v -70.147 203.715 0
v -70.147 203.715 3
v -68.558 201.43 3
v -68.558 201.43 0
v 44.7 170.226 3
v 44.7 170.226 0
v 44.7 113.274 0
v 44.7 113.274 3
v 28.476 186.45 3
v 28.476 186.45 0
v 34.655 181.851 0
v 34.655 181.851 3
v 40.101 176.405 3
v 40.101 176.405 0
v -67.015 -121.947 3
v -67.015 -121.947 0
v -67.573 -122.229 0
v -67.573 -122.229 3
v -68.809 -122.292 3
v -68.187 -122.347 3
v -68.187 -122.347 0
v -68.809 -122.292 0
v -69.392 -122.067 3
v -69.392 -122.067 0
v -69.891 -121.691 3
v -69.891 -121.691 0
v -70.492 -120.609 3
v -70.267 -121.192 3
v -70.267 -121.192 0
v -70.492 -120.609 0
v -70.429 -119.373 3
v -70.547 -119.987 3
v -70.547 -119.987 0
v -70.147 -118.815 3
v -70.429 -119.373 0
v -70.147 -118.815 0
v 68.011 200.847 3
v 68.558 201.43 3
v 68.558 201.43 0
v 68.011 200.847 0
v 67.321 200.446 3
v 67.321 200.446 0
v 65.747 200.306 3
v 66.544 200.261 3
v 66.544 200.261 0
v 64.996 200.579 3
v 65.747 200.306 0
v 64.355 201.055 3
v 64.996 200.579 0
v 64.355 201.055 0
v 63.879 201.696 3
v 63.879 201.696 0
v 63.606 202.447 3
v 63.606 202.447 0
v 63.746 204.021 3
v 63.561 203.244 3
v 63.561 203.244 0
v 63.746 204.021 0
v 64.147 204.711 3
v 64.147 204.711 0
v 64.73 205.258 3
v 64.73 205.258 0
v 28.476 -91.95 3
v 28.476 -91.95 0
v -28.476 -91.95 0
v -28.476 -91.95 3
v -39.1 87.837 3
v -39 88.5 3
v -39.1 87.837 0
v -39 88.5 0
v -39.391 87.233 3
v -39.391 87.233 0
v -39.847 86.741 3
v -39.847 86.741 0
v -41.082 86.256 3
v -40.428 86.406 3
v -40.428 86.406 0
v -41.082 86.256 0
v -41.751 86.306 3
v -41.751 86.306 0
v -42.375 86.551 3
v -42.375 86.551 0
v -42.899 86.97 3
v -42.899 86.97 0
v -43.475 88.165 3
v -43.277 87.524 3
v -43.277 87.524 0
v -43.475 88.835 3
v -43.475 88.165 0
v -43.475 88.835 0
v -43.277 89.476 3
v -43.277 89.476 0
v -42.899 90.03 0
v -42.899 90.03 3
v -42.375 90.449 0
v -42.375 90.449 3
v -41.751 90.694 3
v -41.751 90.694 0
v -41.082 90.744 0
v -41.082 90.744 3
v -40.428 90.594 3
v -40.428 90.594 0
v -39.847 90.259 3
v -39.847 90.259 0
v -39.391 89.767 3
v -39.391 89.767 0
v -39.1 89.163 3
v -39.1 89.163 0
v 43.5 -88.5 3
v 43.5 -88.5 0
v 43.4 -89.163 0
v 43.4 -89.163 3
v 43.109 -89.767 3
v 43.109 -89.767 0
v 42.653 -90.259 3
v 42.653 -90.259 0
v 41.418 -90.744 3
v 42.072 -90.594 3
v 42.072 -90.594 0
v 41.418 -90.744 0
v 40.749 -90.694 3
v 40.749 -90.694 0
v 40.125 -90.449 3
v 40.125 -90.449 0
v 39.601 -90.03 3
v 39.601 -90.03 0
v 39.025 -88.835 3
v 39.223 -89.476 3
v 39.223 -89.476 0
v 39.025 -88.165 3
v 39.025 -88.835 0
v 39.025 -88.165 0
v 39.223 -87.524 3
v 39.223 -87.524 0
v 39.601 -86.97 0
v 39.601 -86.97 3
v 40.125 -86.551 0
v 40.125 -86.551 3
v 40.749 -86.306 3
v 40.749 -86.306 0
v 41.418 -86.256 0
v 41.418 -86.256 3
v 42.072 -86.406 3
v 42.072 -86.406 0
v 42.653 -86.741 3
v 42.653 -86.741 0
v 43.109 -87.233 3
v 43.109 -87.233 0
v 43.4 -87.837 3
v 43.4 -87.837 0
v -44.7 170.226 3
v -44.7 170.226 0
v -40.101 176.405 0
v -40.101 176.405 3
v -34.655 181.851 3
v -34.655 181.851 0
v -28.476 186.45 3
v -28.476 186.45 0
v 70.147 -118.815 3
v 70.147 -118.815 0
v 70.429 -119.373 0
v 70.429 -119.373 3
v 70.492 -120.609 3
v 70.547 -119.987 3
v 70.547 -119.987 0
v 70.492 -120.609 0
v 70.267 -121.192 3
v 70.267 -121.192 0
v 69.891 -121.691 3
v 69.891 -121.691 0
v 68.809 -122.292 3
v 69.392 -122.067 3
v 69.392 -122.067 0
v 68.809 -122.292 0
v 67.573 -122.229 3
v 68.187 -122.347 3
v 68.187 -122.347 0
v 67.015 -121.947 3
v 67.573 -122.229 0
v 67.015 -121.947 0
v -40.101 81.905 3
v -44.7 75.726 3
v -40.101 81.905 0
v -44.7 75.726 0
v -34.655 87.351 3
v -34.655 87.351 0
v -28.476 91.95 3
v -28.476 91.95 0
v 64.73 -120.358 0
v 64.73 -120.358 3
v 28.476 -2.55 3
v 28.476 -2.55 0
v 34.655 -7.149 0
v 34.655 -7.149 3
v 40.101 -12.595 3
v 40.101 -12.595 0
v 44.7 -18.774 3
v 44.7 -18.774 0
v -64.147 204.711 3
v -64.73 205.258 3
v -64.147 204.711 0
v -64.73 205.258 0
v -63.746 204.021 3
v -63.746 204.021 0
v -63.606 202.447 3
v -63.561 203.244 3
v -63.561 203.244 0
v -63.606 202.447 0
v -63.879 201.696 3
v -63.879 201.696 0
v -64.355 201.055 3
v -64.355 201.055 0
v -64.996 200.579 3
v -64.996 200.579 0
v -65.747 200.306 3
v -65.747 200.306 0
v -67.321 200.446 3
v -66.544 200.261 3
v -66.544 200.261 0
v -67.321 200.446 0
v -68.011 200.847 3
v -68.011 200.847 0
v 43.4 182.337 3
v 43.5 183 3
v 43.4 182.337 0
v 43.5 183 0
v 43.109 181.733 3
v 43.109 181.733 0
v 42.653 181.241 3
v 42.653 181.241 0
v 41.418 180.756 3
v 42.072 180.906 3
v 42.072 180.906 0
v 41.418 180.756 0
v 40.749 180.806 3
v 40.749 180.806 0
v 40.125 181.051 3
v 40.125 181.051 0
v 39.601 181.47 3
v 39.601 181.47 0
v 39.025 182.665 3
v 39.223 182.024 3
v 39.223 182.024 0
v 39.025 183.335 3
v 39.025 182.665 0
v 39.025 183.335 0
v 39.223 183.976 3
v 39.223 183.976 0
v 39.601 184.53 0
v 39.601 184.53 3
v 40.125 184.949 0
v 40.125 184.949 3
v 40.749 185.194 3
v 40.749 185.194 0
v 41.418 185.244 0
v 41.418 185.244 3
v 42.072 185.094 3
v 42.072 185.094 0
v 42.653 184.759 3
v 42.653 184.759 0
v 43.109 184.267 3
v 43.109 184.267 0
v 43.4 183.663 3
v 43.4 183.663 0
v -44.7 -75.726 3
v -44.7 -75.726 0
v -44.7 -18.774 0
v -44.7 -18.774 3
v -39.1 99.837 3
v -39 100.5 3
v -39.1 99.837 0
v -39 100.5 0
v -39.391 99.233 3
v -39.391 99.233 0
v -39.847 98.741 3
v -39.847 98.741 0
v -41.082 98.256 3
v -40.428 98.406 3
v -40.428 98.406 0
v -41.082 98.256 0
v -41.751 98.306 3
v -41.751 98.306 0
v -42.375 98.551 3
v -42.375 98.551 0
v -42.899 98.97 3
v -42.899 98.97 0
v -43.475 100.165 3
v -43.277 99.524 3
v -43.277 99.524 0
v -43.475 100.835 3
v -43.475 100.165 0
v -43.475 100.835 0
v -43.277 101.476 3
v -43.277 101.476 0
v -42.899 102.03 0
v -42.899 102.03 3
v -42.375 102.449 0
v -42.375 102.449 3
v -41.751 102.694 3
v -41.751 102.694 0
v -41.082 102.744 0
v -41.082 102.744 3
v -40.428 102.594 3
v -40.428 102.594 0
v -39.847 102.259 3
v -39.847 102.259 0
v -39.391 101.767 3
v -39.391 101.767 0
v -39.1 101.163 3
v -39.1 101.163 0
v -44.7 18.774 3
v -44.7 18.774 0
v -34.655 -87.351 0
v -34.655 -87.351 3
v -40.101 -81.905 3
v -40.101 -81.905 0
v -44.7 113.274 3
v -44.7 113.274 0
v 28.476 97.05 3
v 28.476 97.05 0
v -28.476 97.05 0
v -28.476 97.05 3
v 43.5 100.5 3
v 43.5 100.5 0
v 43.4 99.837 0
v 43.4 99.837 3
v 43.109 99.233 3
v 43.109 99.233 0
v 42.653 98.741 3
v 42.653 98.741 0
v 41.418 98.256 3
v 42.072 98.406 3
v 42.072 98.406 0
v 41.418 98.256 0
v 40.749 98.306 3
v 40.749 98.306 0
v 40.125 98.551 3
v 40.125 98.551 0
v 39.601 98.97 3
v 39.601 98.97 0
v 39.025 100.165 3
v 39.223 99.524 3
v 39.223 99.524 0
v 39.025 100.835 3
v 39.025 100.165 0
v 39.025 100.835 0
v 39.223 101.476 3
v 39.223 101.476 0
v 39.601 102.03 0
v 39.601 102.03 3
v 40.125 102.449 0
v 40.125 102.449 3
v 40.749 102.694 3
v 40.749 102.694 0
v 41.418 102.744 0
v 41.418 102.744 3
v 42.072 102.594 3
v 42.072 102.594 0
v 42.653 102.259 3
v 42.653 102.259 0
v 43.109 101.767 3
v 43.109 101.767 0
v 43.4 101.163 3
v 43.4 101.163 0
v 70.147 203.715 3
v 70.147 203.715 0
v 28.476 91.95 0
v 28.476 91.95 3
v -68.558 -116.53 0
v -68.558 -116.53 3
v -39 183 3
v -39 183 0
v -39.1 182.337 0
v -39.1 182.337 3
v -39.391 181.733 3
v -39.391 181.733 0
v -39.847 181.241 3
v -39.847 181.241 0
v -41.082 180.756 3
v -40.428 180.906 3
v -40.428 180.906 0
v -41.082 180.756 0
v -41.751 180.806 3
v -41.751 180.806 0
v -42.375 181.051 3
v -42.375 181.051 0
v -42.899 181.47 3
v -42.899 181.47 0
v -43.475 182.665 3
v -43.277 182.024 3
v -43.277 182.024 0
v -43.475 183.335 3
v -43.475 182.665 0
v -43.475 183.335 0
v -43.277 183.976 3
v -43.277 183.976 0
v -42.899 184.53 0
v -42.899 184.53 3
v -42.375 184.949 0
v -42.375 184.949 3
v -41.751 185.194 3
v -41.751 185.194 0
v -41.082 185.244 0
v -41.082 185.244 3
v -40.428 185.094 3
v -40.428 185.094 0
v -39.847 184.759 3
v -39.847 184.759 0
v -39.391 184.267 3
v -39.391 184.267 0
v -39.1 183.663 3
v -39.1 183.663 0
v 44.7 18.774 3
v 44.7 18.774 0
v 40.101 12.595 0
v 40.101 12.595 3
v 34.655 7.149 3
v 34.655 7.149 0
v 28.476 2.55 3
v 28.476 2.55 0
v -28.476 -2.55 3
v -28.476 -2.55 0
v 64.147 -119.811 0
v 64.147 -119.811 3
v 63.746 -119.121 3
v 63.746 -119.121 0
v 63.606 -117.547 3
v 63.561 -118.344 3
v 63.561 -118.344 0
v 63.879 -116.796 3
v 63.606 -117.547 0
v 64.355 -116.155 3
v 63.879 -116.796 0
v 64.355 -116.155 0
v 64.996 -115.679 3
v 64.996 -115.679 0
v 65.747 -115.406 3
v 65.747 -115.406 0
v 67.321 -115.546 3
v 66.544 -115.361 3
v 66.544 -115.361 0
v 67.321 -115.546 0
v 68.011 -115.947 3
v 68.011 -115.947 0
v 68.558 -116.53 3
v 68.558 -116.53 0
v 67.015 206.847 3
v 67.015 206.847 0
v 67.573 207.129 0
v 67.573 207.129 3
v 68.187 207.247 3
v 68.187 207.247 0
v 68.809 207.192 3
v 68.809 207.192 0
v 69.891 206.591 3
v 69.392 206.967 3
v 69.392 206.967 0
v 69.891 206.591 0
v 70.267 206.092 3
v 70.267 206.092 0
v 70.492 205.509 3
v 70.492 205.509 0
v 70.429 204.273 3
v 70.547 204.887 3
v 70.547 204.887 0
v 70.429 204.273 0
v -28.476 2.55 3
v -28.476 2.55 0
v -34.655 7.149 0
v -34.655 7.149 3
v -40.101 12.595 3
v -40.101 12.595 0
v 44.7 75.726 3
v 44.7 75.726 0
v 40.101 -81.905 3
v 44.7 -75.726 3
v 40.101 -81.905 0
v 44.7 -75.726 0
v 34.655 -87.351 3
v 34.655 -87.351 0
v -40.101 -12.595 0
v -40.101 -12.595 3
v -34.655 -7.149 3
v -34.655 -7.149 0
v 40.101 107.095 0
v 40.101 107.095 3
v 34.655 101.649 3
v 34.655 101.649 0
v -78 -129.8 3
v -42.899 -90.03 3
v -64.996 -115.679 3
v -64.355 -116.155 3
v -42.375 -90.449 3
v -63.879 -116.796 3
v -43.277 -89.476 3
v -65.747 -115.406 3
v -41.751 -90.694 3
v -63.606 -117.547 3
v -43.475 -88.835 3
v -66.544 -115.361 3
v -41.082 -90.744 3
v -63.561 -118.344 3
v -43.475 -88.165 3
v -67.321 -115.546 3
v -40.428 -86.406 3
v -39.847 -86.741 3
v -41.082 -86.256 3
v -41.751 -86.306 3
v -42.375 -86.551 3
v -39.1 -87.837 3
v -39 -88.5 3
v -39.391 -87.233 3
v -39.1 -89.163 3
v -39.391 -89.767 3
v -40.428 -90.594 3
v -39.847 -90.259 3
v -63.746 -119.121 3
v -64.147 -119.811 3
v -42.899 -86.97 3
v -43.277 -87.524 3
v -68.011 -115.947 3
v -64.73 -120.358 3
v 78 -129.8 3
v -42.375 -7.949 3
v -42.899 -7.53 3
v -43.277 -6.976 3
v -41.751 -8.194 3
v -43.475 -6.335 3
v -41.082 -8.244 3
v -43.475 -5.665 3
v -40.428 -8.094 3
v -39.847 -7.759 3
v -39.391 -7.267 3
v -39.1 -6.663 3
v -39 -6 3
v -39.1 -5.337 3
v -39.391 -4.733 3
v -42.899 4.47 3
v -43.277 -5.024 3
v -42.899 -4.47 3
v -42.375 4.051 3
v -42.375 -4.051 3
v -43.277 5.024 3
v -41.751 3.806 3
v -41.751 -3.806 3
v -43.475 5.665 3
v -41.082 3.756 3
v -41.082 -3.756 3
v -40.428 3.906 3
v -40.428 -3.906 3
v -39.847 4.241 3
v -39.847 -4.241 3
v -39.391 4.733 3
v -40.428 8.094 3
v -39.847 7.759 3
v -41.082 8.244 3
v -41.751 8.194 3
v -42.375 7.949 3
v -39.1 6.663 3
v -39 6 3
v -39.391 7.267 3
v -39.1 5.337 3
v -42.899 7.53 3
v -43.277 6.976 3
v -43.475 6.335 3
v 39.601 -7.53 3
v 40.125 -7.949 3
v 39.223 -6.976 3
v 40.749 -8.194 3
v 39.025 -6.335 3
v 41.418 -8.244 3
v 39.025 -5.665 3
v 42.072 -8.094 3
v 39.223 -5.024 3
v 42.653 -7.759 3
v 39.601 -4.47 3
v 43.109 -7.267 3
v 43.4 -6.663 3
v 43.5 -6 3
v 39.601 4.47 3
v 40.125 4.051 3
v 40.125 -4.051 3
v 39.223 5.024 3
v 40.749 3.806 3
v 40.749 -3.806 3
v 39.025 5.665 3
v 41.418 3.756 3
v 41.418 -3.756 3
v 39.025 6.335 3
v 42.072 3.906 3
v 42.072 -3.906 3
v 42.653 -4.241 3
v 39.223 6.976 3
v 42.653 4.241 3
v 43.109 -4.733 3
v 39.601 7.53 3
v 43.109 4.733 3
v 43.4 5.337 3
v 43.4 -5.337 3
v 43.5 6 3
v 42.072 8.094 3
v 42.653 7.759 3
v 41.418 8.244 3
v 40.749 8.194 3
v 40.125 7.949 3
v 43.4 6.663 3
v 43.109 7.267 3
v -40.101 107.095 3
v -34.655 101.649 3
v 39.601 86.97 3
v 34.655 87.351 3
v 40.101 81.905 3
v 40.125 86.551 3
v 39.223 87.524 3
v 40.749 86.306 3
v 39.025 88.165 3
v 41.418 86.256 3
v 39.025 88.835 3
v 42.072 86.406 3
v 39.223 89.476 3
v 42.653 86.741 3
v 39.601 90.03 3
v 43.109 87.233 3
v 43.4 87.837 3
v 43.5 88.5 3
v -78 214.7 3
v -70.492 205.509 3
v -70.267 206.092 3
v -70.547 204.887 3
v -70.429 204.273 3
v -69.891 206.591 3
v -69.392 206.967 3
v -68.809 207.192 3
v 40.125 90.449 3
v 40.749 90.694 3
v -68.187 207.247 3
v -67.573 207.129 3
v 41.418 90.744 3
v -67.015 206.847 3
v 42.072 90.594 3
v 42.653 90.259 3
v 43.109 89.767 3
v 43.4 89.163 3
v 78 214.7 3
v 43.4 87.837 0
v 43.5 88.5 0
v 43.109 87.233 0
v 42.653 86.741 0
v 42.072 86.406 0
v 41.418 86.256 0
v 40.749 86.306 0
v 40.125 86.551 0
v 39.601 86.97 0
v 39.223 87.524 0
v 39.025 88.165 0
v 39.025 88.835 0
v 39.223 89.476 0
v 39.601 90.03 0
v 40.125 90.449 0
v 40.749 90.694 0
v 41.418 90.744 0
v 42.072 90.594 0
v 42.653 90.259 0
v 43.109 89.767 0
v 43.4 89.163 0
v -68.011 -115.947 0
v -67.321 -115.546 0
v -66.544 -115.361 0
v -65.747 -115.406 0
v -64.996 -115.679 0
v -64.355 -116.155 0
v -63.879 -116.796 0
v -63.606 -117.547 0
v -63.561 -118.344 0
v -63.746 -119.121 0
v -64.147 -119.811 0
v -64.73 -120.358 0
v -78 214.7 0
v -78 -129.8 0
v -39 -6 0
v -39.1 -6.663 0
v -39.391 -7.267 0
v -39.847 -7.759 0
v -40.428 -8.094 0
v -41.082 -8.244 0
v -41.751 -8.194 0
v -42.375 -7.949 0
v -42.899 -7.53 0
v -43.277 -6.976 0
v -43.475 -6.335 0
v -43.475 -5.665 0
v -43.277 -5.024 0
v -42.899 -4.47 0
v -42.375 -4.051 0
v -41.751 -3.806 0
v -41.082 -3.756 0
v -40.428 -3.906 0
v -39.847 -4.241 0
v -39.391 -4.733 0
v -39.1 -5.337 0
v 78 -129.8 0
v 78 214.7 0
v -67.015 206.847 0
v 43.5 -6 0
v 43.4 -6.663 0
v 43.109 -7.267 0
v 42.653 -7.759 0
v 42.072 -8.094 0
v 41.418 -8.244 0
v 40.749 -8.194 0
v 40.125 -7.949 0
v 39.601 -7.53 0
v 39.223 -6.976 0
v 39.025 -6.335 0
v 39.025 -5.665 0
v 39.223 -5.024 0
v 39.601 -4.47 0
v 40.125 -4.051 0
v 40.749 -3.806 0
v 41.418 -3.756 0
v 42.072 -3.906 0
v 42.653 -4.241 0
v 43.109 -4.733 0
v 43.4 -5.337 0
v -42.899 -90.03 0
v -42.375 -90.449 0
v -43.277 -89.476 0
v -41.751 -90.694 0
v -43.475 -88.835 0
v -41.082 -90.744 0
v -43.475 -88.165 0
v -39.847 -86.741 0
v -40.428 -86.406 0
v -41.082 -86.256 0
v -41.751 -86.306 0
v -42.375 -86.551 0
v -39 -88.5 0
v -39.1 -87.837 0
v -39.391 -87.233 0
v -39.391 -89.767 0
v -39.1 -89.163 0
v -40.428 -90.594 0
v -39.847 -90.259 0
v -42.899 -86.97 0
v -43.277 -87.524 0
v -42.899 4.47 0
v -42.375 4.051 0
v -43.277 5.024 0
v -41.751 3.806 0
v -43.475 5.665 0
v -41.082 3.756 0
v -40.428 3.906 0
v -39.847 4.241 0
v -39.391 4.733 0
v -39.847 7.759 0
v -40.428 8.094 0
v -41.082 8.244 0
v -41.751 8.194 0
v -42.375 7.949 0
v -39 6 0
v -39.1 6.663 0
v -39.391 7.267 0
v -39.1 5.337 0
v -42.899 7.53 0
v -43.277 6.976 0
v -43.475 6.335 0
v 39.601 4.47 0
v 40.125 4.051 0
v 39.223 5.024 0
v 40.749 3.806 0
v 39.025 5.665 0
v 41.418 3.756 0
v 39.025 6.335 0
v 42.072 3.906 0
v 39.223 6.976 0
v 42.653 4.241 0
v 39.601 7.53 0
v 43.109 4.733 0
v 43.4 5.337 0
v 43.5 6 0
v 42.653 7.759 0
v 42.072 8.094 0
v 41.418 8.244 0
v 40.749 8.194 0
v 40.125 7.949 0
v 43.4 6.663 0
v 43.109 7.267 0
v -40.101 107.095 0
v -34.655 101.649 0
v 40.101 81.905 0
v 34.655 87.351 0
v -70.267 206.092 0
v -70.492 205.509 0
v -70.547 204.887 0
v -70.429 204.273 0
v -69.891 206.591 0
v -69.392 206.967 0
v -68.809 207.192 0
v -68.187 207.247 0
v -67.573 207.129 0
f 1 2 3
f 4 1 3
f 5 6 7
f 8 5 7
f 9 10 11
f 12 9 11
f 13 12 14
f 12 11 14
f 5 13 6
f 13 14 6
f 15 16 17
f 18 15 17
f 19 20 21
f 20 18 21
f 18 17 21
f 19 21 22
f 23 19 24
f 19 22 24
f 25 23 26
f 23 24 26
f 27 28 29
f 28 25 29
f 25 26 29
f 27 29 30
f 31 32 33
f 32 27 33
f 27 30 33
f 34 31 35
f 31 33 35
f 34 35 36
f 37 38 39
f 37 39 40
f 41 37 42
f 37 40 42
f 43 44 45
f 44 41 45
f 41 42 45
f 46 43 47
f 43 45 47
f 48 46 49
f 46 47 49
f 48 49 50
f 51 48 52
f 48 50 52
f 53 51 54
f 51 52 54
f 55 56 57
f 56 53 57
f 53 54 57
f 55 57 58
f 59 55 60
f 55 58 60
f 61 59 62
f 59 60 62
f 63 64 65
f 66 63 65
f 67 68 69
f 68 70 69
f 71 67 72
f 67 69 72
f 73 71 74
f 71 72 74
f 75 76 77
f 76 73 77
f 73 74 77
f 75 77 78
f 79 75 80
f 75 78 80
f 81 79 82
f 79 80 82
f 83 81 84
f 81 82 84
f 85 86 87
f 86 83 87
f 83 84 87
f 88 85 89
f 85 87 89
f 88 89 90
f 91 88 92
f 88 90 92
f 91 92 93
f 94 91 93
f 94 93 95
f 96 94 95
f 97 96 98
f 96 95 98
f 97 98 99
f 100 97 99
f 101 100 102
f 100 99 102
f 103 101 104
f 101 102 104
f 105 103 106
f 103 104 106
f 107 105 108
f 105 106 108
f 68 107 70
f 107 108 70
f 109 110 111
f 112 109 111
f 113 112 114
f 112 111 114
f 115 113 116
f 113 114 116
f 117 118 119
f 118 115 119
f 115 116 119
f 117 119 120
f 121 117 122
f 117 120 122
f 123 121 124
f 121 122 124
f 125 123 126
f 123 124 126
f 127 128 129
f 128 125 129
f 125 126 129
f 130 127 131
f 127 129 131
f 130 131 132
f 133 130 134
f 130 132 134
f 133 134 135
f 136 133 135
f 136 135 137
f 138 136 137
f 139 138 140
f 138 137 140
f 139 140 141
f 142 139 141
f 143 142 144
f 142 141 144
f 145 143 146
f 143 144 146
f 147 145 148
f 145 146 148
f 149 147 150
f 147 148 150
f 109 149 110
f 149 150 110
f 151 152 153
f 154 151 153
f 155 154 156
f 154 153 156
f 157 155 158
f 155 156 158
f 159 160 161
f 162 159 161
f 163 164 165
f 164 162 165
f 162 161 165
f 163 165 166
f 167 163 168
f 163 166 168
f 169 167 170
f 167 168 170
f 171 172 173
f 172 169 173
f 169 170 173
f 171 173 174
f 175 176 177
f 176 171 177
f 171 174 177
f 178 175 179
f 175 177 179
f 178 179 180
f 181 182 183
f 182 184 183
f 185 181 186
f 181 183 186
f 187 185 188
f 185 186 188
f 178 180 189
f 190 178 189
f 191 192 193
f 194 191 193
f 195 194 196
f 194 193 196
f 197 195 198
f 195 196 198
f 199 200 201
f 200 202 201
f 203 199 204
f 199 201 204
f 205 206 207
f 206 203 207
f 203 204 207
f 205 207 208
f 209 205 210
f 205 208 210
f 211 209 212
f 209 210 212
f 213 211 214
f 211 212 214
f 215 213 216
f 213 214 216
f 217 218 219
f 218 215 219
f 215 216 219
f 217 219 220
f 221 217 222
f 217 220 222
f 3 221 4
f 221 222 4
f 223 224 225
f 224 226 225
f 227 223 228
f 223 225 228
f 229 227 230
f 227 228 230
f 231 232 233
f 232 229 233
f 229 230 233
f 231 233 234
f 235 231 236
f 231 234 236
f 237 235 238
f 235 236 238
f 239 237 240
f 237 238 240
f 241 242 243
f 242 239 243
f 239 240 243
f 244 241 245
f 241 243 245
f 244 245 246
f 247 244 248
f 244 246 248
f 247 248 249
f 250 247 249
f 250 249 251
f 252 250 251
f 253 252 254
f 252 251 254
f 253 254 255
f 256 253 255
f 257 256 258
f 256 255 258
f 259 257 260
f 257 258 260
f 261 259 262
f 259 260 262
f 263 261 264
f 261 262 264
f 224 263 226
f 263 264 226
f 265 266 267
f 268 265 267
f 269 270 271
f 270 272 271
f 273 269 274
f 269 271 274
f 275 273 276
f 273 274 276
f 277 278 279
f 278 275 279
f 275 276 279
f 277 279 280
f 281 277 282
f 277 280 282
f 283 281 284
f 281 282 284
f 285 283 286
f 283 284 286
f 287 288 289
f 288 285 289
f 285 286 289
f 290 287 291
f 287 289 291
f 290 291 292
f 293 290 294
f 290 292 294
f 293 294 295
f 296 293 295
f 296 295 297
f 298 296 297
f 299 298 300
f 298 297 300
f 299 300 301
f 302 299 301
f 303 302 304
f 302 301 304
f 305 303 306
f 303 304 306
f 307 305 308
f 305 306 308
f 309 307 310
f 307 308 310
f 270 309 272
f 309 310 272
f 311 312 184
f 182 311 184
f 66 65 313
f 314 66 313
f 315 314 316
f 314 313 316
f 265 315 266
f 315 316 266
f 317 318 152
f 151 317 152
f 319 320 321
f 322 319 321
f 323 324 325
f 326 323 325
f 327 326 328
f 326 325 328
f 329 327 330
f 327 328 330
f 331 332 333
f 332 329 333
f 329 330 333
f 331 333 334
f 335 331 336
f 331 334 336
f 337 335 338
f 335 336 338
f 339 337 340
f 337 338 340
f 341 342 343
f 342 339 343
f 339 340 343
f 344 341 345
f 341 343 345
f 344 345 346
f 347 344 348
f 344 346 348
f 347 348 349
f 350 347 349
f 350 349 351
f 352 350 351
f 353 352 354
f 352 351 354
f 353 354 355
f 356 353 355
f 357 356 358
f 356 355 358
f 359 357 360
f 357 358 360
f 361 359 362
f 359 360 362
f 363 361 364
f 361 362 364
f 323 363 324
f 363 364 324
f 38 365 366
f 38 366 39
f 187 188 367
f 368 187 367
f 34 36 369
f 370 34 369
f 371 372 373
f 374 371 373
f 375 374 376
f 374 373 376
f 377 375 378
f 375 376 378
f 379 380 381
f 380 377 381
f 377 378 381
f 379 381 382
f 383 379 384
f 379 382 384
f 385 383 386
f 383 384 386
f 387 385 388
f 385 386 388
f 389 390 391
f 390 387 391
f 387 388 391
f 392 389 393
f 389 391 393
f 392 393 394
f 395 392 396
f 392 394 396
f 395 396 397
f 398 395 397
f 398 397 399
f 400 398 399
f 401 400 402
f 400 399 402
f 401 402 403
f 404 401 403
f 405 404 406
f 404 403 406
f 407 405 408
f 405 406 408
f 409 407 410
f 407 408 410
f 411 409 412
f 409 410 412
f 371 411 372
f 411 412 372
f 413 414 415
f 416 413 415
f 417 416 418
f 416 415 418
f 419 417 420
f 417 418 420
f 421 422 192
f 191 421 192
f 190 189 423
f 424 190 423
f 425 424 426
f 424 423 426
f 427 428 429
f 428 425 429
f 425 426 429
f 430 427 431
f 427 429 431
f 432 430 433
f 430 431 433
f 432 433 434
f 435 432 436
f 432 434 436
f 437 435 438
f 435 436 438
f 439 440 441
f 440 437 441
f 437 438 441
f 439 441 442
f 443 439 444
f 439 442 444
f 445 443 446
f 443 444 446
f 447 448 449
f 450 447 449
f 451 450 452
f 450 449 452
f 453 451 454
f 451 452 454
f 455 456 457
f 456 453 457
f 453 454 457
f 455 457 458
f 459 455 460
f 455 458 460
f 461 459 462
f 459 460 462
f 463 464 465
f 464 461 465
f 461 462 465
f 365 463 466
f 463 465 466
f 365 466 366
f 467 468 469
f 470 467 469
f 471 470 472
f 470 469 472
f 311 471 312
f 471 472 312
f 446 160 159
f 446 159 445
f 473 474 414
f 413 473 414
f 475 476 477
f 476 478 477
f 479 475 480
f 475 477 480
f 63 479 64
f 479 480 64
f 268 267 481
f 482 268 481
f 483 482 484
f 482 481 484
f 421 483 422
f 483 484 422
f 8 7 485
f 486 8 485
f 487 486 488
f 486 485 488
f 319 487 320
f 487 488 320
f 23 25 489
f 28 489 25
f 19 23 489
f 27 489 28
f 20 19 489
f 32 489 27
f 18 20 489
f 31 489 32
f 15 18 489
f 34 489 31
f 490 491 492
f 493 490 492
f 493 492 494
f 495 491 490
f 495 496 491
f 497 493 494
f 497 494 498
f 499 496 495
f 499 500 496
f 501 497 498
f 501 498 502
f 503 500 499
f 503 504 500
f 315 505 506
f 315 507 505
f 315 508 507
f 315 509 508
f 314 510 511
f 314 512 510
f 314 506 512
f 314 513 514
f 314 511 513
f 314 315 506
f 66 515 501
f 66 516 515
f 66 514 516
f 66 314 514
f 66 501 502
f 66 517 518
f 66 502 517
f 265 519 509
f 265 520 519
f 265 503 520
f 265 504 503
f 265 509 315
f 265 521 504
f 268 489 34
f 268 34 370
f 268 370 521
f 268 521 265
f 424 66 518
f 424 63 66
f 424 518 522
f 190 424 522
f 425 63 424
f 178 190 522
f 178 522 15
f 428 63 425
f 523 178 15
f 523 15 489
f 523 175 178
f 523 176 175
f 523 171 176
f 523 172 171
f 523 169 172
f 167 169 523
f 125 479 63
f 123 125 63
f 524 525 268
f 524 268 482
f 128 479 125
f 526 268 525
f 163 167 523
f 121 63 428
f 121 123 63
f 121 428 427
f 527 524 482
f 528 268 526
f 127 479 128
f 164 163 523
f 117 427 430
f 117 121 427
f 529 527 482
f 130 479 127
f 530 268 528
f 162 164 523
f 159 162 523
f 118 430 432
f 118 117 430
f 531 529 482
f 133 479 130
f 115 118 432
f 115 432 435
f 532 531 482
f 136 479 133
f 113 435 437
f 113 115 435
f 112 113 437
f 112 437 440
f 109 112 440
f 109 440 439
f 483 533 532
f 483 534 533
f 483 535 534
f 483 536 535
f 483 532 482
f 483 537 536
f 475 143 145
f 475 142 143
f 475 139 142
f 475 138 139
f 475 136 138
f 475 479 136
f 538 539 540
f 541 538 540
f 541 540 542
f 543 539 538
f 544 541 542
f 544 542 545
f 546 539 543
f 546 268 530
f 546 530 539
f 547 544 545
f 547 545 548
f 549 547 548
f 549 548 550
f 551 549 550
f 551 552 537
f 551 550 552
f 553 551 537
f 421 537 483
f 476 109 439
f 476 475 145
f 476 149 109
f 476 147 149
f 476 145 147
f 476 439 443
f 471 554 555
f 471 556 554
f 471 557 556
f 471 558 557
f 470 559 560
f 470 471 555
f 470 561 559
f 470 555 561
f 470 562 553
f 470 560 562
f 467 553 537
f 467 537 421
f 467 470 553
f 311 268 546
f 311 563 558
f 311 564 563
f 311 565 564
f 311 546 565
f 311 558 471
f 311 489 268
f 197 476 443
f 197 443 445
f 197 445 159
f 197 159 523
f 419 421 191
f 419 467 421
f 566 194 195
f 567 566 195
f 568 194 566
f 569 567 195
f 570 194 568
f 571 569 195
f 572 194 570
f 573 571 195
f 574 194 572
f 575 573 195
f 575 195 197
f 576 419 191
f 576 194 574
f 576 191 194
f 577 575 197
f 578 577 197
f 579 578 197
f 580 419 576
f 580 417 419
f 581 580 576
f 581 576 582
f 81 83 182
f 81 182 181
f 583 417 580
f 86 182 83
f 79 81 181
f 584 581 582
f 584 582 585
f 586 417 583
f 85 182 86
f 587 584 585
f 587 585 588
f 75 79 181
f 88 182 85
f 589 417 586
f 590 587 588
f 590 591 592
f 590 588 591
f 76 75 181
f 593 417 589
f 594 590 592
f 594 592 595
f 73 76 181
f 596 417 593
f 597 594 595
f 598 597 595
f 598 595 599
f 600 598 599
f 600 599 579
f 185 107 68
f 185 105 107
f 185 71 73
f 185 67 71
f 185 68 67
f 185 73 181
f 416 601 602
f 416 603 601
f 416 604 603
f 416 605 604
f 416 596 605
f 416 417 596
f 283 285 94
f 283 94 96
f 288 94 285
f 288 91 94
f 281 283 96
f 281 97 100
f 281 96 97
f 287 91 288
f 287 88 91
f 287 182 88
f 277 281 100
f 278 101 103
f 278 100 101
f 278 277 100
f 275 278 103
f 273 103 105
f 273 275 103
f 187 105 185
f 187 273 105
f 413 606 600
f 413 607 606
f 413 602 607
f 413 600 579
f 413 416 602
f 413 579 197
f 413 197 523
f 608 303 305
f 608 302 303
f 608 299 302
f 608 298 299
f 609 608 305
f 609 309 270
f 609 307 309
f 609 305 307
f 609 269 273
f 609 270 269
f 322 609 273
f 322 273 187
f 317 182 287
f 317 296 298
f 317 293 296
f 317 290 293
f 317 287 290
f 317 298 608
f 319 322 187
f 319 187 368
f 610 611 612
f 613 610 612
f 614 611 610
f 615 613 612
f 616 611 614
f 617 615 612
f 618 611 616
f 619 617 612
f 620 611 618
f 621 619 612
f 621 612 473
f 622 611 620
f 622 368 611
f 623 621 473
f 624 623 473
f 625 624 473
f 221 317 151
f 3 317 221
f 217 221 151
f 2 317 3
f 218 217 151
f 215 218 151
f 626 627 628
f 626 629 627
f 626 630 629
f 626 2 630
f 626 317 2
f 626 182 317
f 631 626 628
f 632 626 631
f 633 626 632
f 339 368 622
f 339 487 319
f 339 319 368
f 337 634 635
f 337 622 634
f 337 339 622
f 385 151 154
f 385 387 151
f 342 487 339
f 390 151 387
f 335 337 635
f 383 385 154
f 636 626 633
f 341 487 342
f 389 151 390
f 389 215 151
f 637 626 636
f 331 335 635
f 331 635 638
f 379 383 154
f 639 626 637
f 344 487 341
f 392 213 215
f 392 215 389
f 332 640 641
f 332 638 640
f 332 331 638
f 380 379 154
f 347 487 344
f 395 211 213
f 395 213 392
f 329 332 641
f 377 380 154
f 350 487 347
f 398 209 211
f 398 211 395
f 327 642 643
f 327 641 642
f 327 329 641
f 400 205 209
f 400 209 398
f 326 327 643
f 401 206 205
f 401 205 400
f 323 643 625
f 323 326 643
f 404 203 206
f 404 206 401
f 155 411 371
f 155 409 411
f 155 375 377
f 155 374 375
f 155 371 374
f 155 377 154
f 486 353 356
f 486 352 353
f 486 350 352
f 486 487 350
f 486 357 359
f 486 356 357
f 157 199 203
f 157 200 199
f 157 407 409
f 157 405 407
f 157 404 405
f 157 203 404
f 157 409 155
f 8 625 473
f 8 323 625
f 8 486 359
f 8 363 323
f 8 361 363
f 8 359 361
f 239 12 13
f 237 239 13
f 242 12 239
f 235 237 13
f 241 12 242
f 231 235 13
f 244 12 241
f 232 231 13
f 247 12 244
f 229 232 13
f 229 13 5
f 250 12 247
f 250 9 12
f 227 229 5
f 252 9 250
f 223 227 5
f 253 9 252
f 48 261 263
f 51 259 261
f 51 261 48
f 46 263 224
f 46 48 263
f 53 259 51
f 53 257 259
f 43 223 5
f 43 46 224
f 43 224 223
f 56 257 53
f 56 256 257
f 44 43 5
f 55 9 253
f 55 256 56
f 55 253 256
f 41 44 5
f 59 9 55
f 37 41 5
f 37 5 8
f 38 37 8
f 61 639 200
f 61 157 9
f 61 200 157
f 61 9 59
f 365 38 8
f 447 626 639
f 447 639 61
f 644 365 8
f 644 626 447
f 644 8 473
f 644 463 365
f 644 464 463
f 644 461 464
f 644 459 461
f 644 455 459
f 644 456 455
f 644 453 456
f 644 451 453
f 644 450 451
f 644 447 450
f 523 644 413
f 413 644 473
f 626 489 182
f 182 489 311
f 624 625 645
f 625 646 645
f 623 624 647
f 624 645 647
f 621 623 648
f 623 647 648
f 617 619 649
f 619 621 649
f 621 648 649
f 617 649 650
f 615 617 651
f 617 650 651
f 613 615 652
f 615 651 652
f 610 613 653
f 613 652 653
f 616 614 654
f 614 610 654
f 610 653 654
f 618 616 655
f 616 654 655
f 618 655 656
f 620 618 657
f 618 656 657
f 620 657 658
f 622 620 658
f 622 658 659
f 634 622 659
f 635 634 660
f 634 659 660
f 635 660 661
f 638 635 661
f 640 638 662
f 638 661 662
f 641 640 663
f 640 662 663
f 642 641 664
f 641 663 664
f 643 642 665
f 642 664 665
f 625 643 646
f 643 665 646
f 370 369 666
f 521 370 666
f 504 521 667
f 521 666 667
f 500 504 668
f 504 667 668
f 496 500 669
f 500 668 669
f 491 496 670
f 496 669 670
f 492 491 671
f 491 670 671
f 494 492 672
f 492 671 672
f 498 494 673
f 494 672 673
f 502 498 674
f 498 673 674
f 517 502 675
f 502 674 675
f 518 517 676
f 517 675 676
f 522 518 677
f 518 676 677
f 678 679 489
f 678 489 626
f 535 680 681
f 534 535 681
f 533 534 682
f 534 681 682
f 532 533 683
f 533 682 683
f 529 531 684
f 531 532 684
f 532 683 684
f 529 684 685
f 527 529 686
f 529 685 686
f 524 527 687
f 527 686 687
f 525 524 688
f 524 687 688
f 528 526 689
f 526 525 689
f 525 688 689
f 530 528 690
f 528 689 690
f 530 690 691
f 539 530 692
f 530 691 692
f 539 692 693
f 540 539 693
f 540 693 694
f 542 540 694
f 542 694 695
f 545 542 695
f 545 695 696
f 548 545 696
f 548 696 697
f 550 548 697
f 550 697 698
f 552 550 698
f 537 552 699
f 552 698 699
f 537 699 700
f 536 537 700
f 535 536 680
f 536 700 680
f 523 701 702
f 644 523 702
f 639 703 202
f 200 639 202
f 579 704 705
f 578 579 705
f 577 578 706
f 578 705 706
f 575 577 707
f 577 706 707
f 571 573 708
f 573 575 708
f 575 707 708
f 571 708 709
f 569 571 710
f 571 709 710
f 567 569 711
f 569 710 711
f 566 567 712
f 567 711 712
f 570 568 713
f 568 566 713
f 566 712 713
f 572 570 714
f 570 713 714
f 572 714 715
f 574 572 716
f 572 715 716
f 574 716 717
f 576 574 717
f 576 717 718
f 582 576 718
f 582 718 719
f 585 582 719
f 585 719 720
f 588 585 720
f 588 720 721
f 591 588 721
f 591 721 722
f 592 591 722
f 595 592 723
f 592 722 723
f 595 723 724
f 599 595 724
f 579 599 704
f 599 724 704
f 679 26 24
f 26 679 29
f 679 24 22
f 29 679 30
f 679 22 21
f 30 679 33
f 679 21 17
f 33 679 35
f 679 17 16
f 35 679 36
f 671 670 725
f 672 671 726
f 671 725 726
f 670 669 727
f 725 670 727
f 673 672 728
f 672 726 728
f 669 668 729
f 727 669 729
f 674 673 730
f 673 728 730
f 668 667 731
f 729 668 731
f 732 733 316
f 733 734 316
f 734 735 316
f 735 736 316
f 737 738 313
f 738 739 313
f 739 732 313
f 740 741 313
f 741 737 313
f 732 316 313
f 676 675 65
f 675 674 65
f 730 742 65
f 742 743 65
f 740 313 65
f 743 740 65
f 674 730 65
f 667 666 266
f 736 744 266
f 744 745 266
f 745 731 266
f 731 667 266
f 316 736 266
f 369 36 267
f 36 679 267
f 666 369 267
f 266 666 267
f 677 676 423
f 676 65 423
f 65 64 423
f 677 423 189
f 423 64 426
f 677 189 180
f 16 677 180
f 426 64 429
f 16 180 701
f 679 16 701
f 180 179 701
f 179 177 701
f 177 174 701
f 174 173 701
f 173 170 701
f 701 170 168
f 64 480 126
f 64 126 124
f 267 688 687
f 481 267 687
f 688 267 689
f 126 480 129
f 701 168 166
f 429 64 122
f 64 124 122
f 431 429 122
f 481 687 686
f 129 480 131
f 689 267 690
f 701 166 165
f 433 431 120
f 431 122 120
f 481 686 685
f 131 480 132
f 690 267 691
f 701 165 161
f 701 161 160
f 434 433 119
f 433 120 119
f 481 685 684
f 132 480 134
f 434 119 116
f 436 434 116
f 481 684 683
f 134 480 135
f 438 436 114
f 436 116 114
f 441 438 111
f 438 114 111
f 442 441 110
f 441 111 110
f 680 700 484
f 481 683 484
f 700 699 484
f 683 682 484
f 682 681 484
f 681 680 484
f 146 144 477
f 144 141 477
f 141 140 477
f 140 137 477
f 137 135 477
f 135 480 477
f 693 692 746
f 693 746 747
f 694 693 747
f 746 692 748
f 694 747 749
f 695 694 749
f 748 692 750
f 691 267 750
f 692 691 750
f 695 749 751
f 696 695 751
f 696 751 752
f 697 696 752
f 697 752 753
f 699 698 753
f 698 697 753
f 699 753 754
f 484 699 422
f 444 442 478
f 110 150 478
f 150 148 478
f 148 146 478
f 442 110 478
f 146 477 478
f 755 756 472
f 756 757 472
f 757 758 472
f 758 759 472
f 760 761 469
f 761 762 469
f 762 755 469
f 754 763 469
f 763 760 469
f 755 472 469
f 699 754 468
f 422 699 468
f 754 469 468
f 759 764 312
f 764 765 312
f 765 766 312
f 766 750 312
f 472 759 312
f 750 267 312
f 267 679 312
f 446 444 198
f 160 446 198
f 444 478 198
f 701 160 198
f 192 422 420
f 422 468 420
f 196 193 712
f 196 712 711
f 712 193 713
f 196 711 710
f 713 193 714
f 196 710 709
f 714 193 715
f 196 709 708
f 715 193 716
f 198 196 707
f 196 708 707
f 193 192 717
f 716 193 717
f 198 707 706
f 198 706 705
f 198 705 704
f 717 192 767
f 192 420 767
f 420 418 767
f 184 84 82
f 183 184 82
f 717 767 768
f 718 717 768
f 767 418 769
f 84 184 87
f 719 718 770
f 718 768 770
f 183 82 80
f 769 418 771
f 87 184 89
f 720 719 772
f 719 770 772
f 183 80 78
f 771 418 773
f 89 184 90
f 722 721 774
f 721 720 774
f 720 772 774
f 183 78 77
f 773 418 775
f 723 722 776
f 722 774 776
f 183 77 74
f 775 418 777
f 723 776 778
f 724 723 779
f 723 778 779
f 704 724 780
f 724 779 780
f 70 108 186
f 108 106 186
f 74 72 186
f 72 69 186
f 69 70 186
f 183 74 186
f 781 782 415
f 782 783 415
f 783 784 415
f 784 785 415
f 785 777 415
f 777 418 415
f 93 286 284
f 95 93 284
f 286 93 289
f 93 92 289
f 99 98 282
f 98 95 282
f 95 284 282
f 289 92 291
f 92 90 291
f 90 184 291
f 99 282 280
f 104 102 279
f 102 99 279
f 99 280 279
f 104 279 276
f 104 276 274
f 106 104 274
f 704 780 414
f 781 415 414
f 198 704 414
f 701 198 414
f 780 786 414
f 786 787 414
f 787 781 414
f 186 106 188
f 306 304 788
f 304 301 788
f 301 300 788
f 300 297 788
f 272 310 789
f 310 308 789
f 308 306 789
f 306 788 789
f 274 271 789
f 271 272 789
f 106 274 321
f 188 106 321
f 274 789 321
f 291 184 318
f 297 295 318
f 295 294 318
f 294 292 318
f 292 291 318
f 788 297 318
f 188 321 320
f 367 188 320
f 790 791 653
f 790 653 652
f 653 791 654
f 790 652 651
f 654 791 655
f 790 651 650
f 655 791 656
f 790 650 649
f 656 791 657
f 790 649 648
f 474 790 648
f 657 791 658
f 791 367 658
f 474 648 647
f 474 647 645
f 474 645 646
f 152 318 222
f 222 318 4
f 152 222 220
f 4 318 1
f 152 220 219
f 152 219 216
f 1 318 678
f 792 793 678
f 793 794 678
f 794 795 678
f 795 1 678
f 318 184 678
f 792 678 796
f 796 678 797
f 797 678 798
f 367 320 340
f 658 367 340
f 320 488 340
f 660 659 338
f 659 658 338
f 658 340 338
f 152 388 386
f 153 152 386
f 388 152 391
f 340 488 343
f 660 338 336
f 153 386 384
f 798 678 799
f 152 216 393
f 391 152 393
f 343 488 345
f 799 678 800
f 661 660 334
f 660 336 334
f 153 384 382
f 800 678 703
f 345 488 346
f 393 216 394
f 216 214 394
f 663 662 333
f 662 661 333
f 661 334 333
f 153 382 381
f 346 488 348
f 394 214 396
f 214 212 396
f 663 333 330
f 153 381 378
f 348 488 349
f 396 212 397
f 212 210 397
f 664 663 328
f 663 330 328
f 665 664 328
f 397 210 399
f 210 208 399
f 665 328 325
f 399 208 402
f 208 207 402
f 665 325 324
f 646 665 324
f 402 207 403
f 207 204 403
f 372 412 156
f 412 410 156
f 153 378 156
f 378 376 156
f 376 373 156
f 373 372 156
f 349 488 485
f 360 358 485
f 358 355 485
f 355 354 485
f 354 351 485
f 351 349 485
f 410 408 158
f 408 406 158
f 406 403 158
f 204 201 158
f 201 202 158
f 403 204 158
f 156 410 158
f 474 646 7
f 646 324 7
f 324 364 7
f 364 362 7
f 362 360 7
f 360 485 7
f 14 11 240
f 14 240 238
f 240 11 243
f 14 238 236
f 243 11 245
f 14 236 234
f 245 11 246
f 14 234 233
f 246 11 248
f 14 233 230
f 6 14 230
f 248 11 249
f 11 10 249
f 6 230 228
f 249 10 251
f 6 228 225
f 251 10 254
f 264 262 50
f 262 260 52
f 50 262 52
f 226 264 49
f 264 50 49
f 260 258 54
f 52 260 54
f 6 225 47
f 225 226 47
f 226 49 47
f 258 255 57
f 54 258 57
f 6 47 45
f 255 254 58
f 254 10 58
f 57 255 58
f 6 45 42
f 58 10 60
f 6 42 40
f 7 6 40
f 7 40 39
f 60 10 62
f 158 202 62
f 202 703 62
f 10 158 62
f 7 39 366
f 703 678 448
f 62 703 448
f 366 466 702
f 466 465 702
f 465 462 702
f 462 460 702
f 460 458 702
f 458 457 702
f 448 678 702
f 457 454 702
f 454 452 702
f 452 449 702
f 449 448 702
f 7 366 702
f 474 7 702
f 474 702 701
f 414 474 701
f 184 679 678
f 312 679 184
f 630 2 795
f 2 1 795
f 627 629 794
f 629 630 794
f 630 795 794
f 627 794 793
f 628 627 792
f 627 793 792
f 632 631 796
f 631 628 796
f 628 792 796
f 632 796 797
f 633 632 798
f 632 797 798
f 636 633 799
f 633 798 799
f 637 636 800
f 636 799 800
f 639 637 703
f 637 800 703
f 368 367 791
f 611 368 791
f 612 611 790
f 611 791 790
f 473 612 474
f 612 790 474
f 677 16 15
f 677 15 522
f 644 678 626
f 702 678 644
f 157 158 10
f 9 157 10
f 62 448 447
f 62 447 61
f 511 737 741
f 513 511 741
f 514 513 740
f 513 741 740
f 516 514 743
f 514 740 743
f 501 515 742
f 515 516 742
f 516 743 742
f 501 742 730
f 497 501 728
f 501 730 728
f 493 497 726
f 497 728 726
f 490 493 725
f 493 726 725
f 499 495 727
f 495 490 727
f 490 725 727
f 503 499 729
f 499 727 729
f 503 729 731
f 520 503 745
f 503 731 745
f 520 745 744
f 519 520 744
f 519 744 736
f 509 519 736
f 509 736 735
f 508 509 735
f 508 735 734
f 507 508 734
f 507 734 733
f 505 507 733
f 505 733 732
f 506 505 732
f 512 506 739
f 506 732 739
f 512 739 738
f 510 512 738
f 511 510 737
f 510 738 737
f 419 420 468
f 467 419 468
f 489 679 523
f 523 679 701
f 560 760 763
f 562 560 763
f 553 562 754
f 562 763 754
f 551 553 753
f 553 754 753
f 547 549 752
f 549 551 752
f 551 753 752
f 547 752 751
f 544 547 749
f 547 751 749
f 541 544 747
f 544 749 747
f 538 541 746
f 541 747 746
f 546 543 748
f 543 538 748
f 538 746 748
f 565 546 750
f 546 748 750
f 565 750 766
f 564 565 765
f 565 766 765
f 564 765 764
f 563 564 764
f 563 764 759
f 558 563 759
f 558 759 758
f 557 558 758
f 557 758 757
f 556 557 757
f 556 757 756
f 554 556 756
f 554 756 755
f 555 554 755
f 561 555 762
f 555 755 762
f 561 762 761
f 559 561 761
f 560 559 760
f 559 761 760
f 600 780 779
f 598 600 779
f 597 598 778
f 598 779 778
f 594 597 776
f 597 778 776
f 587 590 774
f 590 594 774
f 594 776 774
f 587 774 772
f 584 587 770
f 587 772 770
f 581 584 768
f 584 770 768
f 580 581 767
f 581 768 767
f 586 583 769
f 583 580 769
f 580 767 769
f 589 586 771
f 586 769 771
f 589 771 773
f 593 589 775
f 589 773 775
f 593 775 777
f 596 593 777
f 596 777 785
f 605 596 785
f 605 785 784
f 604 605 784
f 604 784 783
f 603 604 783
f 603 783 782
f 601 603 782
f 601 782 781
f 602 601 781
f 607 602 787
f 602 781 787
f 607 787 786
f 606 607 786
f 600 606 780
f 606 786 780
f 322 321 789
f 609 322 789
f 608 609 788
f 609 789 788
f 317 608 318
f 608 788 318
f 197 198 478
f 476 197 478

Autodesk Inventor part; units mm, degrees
ref_plane "YZ Plane" through (0, 0, 0) normal (1, 0, 0) x (0, 1, 0)
ref_plane "XZ Plane" through (0, 0, 0) normal (0, 1, 0) x (-1, 0, 0)
ref_plane "XY Plane" through (0, 0, 0) normal (0, 0, 1) x (1, 0, 0)
sketch "Sketch1" plane through (0, 0, 0) normal (0, 0, 1) x (1, 0, 0)
  line L0 (-28.4765, -2.55) -> (28.4765, -2.55)
  arc A0 (44.7, -18.7735) -> (28.4765, -2.55) centre (0, -47.25) ccw
  line L1 (44.7, -18.7735) -> (44.7, -75.7265)
  arc A1 (28.4765, -91.95) -> (44.7, -75.7265) centre (0, -47.25) ccw
  line L2 (28.4765, -91.95) -> (-28.4765, -91.95)
  arc A2 (-44.7, -75.7265) -> (-28.4765, -91.95) centre (0, -47.25) ccw
  line L3 (-44.7, -75.7265) -> (-44.7, -18.7735)
  arc A3 (-28.4765, -2.55) -> (-44.7, -18.7735) centre (0, -47.25) ccw
  line L4 (-28.4765, 91.95) -> (28.4765, 91.95)
  arc A4 (44.7, 75.7265) -> (28.4765, 91.95) centre (0, 47.25) ccw
  line L5 (44.7, 75.7265) -> (44.7, 18.7735)
  arc A5 (28.4765, 2.55) -> (44.7, 18.7735) centre (0, 47.25) ccw
  line L6 (28.4765, 2.55) -> (-28.4765, 2.55)
  arc A6 (-44.7, 18.7735) -> (-28.4765, 2.55) centre (0, 47.25) ccw
  line L7 (-44.7, 18.7735) -> (-44.7, 75.7265)
  arc A7 (-28.4765, 91.95) -> (-44.7, 75.7265) centre (0, 47.25) ccw
  line L8 (-28.4765, 186.45) -> (28.4765, 186.45)
  arc A8 (44.7, 170.2265) -> (28.4765, 186.45) centre (0, 141.75) ccw
  line L9 (44.7, 170.2265) -> (44.7, 113.2735)
  arc A9 (28.4765, 97.05) -> (44.7, 113.2735) centre (0, 141.75) ccw
  line L10 (28.4765, 97.05) -> (-28.4765, 97.05)
  arc A10 (-44.7, 113.2735) -> (-28.4765, 97.05) centre (0, 141.75) ccw
  line L11 (-44.7, 113.2735) -> (-44.7, 170.2265)
  arc A11 (-28.4765, 186.45) -> (-44.7, 170.2265) centre (0, 141.75) ccw
  circle A12 centre (-41.25, -88.5) radius 2.25
  circle A13 centre (41.25, -88.5) radius 2.25
  circle A14 centre (41.25, -6) radius 2.25
  circle A15 centre (-41.25, -6) radius 2.25
  circle A16 centre (-41.25, 6) radius 2.25
  circle A17 centre (41.25, 6) radius 2.25
  circle A18 centre (41.25, 88.5) radius 2.25
  circle A19 centre (-41.25, 88.5) radius 2.25
  circle A20 centre (41.25, 183) radius 2.25
  circle A21 centre (41.25, 100.5) radius 2.25
  circle A22 centre (-41.25, 100.5) radius 2.25
  circle A23 centre (-41.25, 183) radius 2.25
  arc A24 (15.0245, 209.46) -> (15.0245, 194.54) centre (17.5, 202) ccw
  line L12 (15.0245, 209.46) -> (19.9755, 209.46)
  arc A25 (19.9755, 194.54) -> (19.9755, 209.46) centre (17.5, 202) ccw
  line L13 (19.9755, 194.54) -> (15.0245, 194.54)
  arc A26 (-15.0245, 194.54) -> (-15.0245, 209.46) centre (-17.5, 202) ccw
  line L14 (-15.0245, 194.54) -> (-19.9755, 194.54)
  arc A27 (-19.9755, 209.46) -> (-19.9755, 194.54) centre (-17.5, 202) ccw
  line L15 (-19.9755, 209.46) -> (-15.0245, 209.46)
  line L16 (-54.7, 214.7) -> (54.7, 214.7)
  line L17 (54.7, -129.8) -> (-54.7, -129.8)
  line L18 (-78, -129.8) -> (78, -129.8)
  line L19 (-78, -129.8) -> (-78, 214.7)
  arc A28 (-64.7298, -120.3577) -> (-68.5577, -116.5298) centre (-66.3, -118.1) ccw
  arc A29 (-70.1472, -118.8153) -> (-67.0153, -121.9472) centre (-68.3, -120.1) ccw
  line L20 (-67.0153, -121.9472) -> (-64.7298, -120.3577)
  line L21 (-70.1472, -118.8153) -> (-68.5577, -116.5298)
  arc A30 (68.5577, -116.5298) -> (64.7298, -120.3577) centre (66.3, -118.1) ccw
  arc A31 (67.0153, -121.9472) -> (70.1472, -118.8153) centre (68.3, -120.1) ccw
  line L22 (67.0153, -121.9472) -> (64.7298, -120.3577)
  line L23 (70.1472, -118.8153) -> (68.5577, -116.5298)
  line L24 (78, -129.8) -> (78, 214.7)
  arc A32 (-68.5577, 201.4298) -> (-64.7298, 205.2577) centre (-66.3, 203) ccw
  arc A33 (-67.0153, 206.8472) -> (-70.1472, 203.7153) centre (-68.3, 205) ccw
  line L25 (-67.0153, 206.8472) -> (-64.7298, 205.2577)
  line L26 (-70.1472, 203.7153) -> (-68.5577, 201.4298)
  line L27 (70.1472, 203.7153) -> (68.5577, 201.4298)
  arc A34 (64.7298, 205.2577) -> (68.5577, 201.4298) centre (66.3, 203) ccw
  line L28 (67.0153, 206.8472) -> (64.7298, 205.2577)
  arc A35 (70.1472, 203.7153) -> (67.0153, 206.8472) centre (68.3, 205) ccw
  line L29 (-78, 214.7) -> (78, 214.7)
  point P0 (-54.7, -129.8)
  point P1 (54.7, -129.8)
  point P2 (0, 205.2577)
  dimension "d197" = 156
  dimension "d199" = 344.5
  dimension "d221" = 344.5
  dimension "d224" = 9.7
  dimension "d225" = 9.7
  dimension "d228" = 11.7
  dimension "d229" = 11.7
  dimension "d232" = 5.5
  dimension "d233" = 4.5
extrude "Extrusion1" add sketch "Sketch1" along normal blind 3
sketch "Sketch2" plane through (0, 0, 3) normal (0, 0, 1) x (1, 0, 0)
  line L0 (28.4765, 97.05) -> (-28.4765, 97.05) projected
  arc A0 (-44.7, 113.2735) -> (-28.4765, 97.05) centre (0, 141.75) ccw projected
  line L1 (-44.7, 113.2735) -> (-44.7, 170.2265) projected
  arc A1 (-28.4765, 186.45) -> (-44.7, 170.2265) centre (0, 141.75) ccw projected
  line L2 (-28.4765, 186.45) -> (28.4765, 186.45) projected
  arc A2 (44.7, 170.2265) -> (28.4765, 186.45) centre (0, 141.75) ccw projected
  line L3 (44.7, 170.2265) -> (44.7, 113.2735) projected
  arc A3 (28.4765, 97.05) -> (44.7, 113.2735) centre (0, 141.75) ccw projected
  line L4 (44.7, 75.7265) -> (44.7, 18.7735) projected
  arc A4 (28.4765, 2.55) -> (44.7, 18.7735) centre (0, 47.25) ccw projected
  line L5 (28.4765, 2.55) -> (-28.4765, 2.55) projected
  arc A5 (-44.7, 18.7735) -> (-28.4765, 2.55) centre (0, 47.25) ccw projected
  line L6 (-44.7, 18.7735) -> (-44.7, 75.7265) projected
  arc A6 (-28.4765, 91.95) -> (-44.7, 75.7265) centre (0, 47.25) ccw projected
  line L7 (-28.4765, 91.95) -> (28.4765, 91.95) projected
  arc A7 (44.7, 75.7265) -> (28.4765, 91.95) centre (0, 47.25) ccw projected
  arc A8 (28.4765, -91.95) -> (44.7, -75.7265) centre (0, -47.25) ccw projected
  line L8 (28.4765, -91.95) -> (-28.4765, -91.95) projected
  arc A9 (-44.7, -75.7265) -> (-28.4765, -91.95) centre (0, -47.25) ccw projected
  line L9 (-44.7, -75.7265) -> (-44.7, -18.7735) projected
  arc A10 (-28.4765, -2.55) -> (-44.7, -18.7735) centre (0, -47.25) ccw projected
  line L10 (-28.4765, -2.55) -> (28.4765, -2.55) projected
  arc A11 (44.7, -18.7735) -> (28.4765, -2.55) centre (0, -47.25) ccw projected
  line L11 (44.7, -18.7735) -> (44.7, -75.7265) projected
  line L12 (-15.0245, 194.54) -> (-19.9755, 194.54) projected
  arc A12 (-19.9755, 209.46) -> (-19.9755, 194.54) centre (-17.5, 202) ccw projected
  line L13 (-19.9755, 209.46) -> (-15.0245, 209.46) projected
  arc A13 (-15.0245, 194.54) -> (-15.0245, 209.46) centre (-17.5, 202) ccw projected
  line L14 (15.0245, 209.46) -> (19.9755, 209.46) projected
  arc A14 (19.9755, 194.54) -> (19.9755, 209.46) centre (17.5, 202) ccw projected
  line L15 (19.9755, 194.54) -> (15.0245, 194.54) projected
  arc A15 (15.0245, 209.46) -> (15.0245, 194.54) centre (17.5, 202) ccw projected
  arc A16 (64.7298, 205.2577) -> (68.5577, 201.4298) centre (66.3, 203) ccw projected
  line L16 (64.7298, 205.2577) -> (67.0153, 206.8472) projected
  arc A17 (70.1472, 203.7153) -> (67.0153, 206.8472) centre (68.3, 205) ccw projected
  line L17 (70.1472, 203.7153) -> (68.5577, 201.4298) projected
  arc A18 (-67.0153, 206.8472) -> (-70.1472, 203.7153) centre (-68.3, 205) ccw projected
  line L18 (-67.0153, 206.8472) -> (-64.7298, 205.2577) projected
  arc A19 (-68.5577, 201.4298) -> (-64.7298, 205.2577) centre (-66.3, 203) ccw projected
  line L19 (-68.5577, 201.4298) -> (-70.1472, 203.7153) projected
  arc A20 (67.0153, -121.9472) -> (70.1472, -118.8153) centre (68.3, -120.1) ccw projected
  line L20 (67.0153, -121.9472) -> (64.7298, -120.3577) projected
  arc A21 (68.5577, -116.5298) -> (64.7298, -120.3577) centre (66.3, -118.1) ccw projected
  line L21 (68.5577, -116.5298) -> (70.1472, -118.8153) projected
  arc A22 (-64.7298, -120.3577) -> (-68.5577, -116.5298) centre (-66.3, -118.1) ccw projected
  line L22 (-64.7298, -120.3577) -> (-67.0153, -121.9472) projected
  arc A23 (-70.1472, -118.8153) -> (-67.0153, -121.9472) centre (-68.3, -120.1) ccw projected
  line L23 (-70.1472, -118.8153) -> (-68.5577, -116.5298) projected
  circle A24 centre (41.25, 6) radius 2.25 projected
  circle A25 centre (41.25, 100.5) radius 2.25 projected
  circle A26 centre (41.25, 88.5) radius 2.25 projected
  circle A27 centre (-41.25, 100.5) radius 2.25 projected
  circle A28 centre (-41.25, 88.5) radius 2.25 projected
  circle A29 centre (-41.25, 6) radius 2.25 projected
  circle A30 centre (-41.25, -6) radius 2.25 projected
  circle A31 centre (41.25, -6) radius 2.25 projected
  circle A32 centre (41.25, 183) radius 2.25 projected
  circle A33 centre (-41.25, 183) radius 2.25 projected
  circle A34 centre (41.25, -88.5) radius 2.25 projected
  circle A35 centre (-41.25, -88.5) radius 2.25 projected
  line L24 (-78, -129.8) -> (78, -129.8) projected
  line L25 (78, -129.8) -> (78, 214.7) projected
  line L26 (78, 214.7) -> (-78, 214.7) projected
  line L27 (-78, 214.7) -> (-78, -129.8) projected
  point P0 (0, 0)
extrude "Extrusion2" add sketch "Sketch2" against normal up to surface (3 mm away) contours L12 A12 L13 A13 | L14 A14 L15 A15
equation "\"d221\" = d199"
equation "\"d224\" = d222"
equation "\"d225\" = d223"
equation "\"d229\" = d228"
equation "\"d222\" = 9.7"
equation "\"d223\" = 9.7"
properties part number "front_panel2"
